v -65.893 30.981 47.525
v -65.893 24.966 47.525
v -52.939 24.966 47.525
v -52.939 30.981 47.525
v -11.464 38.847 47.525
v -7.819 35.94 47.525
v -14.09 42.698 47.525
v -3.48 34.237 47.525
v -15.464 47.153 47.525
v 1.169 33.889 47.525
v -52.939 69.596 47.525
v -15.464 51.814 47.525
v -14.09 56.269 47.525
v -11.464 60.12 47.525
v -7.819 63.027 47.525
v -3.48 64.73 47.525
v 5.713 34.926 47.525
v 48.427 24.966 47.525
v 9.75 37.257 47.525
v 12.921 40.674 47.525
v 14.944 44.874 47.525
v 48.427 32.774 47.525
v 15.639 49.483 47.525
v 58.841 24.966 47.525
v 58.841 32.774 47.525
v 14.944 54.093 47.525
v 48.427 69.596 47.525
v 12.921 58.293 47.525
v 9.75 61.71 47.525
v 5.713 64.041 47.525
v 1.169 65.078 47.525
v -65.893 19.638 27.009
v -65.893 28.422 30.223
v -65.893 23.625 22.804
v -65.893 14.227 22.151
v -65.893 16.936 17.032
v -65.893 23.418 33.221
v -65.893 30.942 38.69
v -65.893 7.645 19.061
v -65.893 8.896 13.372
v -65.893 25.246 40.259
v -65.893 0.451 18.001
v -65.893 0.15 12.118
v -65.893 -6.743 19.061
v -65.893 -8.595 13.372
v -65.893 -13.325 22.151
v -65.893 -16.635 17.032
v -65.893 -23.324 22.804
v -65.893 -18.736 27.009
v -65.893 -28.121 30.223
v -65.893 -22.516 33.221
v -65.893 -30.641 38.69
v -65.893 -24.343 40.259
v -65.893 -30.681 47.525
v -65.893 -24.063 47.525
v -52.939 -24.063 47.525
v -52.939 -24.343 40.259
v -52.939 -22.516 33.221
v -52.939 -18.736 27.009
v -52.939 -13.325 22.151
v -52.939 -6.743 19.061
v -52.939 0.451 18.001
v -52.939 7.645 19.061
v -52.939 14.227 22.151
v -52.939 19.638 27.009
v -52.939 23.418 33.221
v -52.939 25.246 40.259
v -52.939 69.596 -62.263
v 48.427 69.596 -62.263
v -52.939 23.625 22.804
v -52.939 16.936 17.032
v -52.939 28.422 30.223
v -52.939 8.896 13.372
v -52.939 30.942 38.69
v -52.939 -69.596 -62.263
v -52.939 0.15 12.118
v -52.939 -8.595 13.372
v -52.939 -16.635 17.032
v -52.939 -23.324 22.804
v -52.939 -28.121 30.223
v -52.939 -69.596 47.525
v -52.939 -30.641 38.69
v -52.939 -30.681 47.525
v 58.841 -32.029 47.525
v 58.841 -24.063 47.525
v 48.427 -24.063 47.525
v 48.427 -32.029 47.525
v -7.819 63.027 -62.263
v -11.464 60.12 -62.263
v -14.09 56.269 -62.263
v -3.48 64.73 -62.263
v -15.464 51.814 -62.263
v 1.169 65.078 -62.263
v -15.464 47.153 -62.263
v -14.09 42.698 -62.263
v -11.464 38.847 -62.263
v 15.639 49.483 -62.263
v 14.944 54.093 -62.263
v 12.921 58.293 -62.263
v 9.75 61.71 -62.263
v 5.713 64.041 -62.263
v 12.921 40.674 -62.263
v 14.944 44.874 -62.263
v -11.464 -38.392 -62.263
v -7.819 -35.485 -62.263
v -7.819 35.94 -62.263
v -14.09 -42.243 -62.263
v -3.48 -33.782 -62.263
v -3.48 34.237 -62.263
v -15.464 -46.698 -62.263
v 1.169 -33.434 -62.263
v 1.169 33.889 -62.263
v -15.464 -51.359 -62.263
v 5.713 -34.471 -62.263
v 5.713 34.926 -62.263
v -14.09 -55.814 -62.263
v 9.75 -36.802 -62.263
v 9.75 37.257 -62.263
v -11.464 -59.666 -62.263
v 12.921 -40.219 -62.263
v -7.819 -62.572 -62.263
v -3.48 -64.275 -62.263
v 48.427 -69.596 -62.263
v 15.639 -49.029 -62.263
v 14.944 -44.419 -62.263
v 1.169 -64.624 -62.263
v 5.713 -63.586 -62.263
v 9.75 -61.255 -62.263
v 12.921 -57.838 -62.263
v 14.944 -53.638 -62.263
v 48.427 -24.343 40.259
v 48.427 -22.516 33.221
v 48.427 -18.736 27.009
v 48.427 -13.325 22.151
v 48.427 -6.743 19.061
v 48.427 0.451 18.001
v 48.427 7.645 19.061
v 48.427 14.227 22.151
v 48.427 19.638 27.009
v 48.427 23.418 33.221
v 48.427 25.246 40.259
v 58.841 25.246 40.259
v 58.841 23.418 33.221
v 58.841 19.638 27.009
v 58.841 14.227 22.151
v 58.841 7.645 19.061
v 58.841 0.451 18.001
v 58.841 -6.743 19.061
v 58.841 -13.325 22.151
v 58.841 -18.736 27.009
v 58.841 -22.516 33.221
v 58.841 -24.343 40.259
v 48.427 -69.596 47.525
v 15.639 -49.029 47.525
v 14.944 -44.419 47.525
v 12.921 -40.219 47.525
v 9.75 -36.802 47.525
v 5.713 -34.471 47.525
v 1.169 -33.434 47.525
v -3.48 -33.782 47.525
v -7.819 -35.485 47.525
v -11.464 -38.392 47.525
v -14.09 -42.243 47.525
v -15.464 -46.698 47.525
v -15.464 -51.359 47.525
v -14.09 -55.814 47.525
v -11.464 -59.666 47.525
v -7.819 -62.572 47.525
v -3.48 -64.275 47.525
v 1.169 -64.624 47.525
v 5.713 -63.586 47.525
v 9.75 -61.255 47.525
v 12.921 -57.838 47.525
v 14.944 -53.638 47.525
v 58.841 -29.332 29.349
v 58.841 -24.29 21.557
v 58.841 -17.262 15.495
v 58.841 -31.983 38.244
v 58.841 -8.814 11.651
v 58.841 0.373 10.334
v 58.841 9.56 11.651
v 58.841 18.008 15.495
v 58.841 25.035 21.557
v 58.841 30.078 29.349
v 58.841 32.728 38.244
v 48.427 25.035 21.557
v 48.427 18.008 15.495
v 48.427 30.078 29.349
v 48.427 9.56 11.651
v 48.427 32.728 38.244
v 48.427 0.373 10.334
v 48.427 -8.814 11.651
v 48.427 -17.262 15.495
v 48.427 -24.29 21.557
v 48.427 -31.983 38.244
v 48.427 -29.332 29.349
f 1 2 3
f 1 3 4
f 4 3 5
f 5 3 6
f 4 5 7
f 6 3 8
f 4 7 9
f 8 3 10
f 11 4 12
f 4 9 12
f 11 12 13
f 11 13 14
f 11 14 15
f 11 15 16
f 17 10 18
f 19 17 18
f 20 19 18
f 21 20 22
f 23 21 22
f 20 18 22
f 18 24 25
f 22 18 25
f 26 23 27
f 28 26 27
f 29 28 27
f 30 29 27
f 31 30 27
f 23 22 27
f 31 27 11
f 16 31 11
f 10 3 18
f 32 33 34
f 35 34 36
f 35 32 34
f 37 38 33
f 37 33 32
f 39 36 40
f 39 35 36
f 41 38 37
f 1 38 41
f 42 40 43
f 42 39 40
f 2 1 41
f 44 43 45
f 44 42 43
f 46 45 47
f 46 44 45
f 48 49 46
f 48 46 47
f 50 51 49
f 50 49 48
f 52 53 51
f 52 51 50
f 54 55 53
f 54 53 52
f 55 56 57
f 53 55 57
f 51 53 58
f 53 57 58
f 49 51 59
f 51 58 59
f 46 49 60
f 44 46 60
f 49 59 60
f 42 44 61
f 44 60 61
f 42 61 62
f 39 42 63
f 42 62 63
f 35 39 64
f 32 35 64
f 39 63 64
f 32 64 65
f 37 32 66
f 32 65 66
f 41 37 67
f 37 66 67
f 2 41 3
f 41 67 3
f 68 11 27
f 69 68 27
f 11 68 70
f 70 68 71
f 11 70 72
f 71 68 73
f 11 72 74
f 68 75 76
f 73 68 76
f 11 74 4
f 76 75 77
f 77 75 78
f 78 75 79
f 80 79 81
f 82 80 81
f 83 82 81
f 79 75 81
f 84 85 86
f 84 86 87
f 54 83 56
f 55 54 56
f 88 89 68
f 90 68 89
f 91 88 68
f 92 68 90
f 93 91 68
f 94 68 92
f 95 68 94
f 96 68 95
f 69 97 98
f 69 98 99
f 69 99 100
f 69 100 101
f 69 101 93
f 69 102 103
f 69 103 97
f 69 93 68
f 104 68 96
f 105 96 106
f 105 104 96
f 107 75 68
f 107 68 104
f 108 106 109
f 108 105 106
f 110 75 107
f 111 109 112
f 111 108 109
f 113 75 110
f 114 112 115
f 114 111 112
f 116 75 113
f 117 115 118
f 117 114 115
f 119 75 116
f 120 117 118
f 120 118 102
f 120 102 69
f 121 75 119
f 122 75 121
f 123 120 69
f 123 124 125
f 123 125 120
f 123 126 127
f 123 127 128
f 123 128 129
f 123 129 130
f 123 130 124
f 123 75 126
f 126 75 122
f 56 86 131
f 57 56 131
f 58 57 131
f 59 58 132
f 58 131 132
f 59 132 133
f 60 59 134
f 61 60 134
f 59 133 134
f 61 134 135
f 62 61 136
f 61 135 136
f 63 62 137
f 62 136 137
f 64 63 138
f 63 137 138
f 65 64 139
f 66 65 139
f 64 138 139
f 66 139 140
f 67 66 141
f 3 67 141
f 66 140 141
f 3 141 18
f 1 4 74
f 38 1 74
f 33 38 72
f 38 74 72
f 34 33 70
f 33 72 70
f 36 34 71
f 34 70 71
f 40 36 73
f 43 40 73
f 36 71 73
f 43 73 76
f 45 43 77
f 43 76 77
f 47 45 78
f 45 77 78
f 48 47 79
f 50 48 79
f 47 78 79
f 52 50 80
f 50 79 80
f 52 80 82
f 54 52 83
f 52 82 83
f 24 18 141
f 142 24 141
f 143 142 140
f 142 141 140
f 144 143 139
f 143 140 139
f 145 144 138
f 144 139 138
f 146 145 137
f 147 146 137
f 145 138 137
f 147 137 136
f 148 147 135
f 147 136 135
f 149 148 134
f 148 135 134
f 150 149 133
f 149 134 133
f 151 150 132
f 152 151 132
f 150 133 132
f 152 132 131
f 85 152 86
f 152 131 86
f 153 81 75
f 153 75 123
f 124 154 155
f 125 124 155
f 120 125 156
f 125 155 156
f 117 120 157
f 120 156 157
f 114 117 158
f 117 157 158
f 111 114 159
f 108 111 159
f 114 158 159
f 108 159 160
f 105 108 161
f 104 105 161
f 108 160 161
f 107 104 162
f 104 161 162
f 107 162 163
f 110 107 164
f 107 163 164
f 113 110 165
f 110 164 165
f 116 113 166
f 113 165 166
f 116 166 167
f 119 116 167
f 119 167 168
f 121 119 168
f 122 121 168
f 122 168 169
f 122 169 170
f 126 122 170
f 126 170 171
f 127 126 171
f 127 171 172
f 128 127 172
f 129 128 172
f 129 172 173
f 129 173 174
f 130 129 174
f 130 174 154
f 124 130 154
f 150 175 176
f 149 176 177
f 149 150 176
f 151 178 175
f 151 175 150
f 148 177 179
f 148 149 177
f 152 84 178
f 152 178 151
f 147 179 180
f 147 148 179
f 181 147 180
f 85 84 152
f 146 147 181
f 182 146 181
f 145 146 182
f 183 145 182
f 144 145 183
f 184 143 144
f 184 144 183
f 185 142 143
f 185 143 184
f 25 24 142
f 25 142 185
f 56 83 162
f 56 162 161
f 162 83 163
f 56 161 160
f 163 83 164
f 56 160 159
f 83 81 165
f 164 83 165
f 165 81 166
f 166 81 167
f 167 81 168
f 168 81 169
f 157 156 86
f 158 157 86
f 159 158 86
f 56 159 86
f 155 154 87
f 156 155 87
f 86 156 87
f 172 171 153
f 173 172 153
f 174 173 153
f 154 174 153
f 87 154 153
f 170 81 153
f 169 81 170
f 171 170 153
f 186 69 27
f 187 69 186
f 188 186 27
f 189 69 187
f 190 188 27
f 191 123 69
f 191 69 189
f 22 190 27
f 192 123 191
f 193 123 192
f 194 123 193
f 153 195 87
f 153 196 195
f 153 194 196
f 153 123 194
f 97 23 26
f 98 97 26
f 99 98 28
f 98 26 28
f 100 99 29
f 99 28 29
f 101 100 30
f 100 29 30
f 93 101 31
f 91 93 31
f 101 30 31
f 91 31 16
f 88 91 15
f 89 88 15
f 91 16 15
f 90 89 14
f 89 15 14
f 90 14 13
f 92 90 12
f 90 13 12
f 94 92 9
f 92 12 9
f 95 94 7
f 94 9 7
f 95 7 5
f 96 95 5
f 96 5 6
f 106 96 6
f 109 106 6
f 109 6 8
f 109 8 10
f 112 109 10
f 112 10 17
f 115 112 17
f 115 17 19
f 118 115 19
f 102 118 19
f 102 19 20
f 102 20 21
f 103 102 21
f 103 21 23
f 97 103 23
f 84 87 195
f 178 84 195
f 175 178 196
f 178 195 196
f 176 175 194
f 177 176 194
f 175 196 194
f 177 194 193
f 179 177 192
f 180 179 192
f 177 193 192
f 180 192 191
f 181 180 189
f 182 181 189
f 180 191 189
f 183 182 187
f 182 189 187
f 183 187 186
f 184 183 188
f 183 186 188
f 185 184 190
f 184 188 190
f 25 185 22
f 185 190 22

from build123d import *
from build123d import SkipClean  # not in build123d's __all__

# Parameters (mm, degrees)
F0_W     = 101.3660542667
F0_H     = 109.7881607711
F1_DEPTH = 69.596
F3_DEPTH = 101.3670542667
F5_DEPTH = 10.414
F7_DEPTH = 12.954
F8_R     = 15.6385789161
F9_DEPTH = 109.7891607711


# Not quite as in the source:
# - after a boolean that leaves OpenCascade's solid faulty, fix() repairs it


with BuildPart() as f1:
    # F0 (on Front) → F1 (new body, symmetric)
    with BuildSketch(Plane.XZ):
        with Locations((-2.2559221834, -7.3693413287)):
            Rectangle(F0_W, F0_H)
    extrude(amount=F1_DEPTH, both=True)

    # F2 (on face) → F3 (cut, through all)
    with BuildSketch(Plane.YZ.offset(48.42710495)):
        with BuildLine():
            Line((24.9655246735, 47.5247390568), (-24.0631587803, 47.5247390568))
            ThreePointArc((-24.0631587803, 47.5247390568), (0.4511829466, 18.0011880568), (24.9655246735, 47.5247390568))
        make_face()
    extrude(amount=-F3_DEPTH, mode=Mode.SUBTRACT)

    # F4 (on face) → F5 (join)
    with BuildSketch(Plane.YZ.offset(48.42710495)):
        with BuildLine():
            Line((-24.0631587803, 47.5247390568), (-32.028503716, 47.5247390568))
            ThreePointArc((-32.028503716, 47.5247390568), (0.372864306, 10.3342526114), (32.7742323279, 47.5247390568))
            Line((32.7742323279, 47.5247390568), (24.9655246735, 47.5247390568))
            ThreePointArc((24.9655246735, 47.5247390568), (0.4511829466, 18.0011880568), (-24.0631587803, 47.5247390568))
        make_face()
    with SkipClean():  # cleaning this boolean's faces spoils the solid; the shape is the same uncleaned
        extrude(amount=F5_DEPTH)

    # F6 (on face) → F7 (join)
    with BuildSketch(Plane(origin=(-52.9389493167, 0, 0), x_dir=(0, -1, 0), z_dir=(-1, 0, 0))):
        with BuildLine():
            Line((-24.9655246735, 47.5247390568), (-30.9813152999, 47.5247390568))
            ThreePointArc((-30.9813152999, 47.5247390568), (-0.1503955573, 12.1180891172), (30.6805241853, 47.5247390568))
            Line((30.6805241853, 47.5247390568), (24.0631587803, 47.5247390568))
            ThreePointArc((24.0631587803, 47.5247390568), (-0.4511829466, 18.0011880568), (-24.9655246735, 47.5247390568))
        make_face()
    extrude(amount=F7_DEPTH)

    add(f1.part.fix(), mode=Mode.REPLACE)

    # F8 (on face) → F9 (cut, through all)
    with BuildSketch(Plane.XY.offset(47.5247390568)):
        with Locations((0, 49.4834557176)):
            Circle(F8_R)
        with Locations((-2.8148e-06, -49.0286834538)):
            Circle(F8_R)
    extrude(amount=-F9_DEPTH, mode=Mode.SUBTRACT)


solid = f1.part
